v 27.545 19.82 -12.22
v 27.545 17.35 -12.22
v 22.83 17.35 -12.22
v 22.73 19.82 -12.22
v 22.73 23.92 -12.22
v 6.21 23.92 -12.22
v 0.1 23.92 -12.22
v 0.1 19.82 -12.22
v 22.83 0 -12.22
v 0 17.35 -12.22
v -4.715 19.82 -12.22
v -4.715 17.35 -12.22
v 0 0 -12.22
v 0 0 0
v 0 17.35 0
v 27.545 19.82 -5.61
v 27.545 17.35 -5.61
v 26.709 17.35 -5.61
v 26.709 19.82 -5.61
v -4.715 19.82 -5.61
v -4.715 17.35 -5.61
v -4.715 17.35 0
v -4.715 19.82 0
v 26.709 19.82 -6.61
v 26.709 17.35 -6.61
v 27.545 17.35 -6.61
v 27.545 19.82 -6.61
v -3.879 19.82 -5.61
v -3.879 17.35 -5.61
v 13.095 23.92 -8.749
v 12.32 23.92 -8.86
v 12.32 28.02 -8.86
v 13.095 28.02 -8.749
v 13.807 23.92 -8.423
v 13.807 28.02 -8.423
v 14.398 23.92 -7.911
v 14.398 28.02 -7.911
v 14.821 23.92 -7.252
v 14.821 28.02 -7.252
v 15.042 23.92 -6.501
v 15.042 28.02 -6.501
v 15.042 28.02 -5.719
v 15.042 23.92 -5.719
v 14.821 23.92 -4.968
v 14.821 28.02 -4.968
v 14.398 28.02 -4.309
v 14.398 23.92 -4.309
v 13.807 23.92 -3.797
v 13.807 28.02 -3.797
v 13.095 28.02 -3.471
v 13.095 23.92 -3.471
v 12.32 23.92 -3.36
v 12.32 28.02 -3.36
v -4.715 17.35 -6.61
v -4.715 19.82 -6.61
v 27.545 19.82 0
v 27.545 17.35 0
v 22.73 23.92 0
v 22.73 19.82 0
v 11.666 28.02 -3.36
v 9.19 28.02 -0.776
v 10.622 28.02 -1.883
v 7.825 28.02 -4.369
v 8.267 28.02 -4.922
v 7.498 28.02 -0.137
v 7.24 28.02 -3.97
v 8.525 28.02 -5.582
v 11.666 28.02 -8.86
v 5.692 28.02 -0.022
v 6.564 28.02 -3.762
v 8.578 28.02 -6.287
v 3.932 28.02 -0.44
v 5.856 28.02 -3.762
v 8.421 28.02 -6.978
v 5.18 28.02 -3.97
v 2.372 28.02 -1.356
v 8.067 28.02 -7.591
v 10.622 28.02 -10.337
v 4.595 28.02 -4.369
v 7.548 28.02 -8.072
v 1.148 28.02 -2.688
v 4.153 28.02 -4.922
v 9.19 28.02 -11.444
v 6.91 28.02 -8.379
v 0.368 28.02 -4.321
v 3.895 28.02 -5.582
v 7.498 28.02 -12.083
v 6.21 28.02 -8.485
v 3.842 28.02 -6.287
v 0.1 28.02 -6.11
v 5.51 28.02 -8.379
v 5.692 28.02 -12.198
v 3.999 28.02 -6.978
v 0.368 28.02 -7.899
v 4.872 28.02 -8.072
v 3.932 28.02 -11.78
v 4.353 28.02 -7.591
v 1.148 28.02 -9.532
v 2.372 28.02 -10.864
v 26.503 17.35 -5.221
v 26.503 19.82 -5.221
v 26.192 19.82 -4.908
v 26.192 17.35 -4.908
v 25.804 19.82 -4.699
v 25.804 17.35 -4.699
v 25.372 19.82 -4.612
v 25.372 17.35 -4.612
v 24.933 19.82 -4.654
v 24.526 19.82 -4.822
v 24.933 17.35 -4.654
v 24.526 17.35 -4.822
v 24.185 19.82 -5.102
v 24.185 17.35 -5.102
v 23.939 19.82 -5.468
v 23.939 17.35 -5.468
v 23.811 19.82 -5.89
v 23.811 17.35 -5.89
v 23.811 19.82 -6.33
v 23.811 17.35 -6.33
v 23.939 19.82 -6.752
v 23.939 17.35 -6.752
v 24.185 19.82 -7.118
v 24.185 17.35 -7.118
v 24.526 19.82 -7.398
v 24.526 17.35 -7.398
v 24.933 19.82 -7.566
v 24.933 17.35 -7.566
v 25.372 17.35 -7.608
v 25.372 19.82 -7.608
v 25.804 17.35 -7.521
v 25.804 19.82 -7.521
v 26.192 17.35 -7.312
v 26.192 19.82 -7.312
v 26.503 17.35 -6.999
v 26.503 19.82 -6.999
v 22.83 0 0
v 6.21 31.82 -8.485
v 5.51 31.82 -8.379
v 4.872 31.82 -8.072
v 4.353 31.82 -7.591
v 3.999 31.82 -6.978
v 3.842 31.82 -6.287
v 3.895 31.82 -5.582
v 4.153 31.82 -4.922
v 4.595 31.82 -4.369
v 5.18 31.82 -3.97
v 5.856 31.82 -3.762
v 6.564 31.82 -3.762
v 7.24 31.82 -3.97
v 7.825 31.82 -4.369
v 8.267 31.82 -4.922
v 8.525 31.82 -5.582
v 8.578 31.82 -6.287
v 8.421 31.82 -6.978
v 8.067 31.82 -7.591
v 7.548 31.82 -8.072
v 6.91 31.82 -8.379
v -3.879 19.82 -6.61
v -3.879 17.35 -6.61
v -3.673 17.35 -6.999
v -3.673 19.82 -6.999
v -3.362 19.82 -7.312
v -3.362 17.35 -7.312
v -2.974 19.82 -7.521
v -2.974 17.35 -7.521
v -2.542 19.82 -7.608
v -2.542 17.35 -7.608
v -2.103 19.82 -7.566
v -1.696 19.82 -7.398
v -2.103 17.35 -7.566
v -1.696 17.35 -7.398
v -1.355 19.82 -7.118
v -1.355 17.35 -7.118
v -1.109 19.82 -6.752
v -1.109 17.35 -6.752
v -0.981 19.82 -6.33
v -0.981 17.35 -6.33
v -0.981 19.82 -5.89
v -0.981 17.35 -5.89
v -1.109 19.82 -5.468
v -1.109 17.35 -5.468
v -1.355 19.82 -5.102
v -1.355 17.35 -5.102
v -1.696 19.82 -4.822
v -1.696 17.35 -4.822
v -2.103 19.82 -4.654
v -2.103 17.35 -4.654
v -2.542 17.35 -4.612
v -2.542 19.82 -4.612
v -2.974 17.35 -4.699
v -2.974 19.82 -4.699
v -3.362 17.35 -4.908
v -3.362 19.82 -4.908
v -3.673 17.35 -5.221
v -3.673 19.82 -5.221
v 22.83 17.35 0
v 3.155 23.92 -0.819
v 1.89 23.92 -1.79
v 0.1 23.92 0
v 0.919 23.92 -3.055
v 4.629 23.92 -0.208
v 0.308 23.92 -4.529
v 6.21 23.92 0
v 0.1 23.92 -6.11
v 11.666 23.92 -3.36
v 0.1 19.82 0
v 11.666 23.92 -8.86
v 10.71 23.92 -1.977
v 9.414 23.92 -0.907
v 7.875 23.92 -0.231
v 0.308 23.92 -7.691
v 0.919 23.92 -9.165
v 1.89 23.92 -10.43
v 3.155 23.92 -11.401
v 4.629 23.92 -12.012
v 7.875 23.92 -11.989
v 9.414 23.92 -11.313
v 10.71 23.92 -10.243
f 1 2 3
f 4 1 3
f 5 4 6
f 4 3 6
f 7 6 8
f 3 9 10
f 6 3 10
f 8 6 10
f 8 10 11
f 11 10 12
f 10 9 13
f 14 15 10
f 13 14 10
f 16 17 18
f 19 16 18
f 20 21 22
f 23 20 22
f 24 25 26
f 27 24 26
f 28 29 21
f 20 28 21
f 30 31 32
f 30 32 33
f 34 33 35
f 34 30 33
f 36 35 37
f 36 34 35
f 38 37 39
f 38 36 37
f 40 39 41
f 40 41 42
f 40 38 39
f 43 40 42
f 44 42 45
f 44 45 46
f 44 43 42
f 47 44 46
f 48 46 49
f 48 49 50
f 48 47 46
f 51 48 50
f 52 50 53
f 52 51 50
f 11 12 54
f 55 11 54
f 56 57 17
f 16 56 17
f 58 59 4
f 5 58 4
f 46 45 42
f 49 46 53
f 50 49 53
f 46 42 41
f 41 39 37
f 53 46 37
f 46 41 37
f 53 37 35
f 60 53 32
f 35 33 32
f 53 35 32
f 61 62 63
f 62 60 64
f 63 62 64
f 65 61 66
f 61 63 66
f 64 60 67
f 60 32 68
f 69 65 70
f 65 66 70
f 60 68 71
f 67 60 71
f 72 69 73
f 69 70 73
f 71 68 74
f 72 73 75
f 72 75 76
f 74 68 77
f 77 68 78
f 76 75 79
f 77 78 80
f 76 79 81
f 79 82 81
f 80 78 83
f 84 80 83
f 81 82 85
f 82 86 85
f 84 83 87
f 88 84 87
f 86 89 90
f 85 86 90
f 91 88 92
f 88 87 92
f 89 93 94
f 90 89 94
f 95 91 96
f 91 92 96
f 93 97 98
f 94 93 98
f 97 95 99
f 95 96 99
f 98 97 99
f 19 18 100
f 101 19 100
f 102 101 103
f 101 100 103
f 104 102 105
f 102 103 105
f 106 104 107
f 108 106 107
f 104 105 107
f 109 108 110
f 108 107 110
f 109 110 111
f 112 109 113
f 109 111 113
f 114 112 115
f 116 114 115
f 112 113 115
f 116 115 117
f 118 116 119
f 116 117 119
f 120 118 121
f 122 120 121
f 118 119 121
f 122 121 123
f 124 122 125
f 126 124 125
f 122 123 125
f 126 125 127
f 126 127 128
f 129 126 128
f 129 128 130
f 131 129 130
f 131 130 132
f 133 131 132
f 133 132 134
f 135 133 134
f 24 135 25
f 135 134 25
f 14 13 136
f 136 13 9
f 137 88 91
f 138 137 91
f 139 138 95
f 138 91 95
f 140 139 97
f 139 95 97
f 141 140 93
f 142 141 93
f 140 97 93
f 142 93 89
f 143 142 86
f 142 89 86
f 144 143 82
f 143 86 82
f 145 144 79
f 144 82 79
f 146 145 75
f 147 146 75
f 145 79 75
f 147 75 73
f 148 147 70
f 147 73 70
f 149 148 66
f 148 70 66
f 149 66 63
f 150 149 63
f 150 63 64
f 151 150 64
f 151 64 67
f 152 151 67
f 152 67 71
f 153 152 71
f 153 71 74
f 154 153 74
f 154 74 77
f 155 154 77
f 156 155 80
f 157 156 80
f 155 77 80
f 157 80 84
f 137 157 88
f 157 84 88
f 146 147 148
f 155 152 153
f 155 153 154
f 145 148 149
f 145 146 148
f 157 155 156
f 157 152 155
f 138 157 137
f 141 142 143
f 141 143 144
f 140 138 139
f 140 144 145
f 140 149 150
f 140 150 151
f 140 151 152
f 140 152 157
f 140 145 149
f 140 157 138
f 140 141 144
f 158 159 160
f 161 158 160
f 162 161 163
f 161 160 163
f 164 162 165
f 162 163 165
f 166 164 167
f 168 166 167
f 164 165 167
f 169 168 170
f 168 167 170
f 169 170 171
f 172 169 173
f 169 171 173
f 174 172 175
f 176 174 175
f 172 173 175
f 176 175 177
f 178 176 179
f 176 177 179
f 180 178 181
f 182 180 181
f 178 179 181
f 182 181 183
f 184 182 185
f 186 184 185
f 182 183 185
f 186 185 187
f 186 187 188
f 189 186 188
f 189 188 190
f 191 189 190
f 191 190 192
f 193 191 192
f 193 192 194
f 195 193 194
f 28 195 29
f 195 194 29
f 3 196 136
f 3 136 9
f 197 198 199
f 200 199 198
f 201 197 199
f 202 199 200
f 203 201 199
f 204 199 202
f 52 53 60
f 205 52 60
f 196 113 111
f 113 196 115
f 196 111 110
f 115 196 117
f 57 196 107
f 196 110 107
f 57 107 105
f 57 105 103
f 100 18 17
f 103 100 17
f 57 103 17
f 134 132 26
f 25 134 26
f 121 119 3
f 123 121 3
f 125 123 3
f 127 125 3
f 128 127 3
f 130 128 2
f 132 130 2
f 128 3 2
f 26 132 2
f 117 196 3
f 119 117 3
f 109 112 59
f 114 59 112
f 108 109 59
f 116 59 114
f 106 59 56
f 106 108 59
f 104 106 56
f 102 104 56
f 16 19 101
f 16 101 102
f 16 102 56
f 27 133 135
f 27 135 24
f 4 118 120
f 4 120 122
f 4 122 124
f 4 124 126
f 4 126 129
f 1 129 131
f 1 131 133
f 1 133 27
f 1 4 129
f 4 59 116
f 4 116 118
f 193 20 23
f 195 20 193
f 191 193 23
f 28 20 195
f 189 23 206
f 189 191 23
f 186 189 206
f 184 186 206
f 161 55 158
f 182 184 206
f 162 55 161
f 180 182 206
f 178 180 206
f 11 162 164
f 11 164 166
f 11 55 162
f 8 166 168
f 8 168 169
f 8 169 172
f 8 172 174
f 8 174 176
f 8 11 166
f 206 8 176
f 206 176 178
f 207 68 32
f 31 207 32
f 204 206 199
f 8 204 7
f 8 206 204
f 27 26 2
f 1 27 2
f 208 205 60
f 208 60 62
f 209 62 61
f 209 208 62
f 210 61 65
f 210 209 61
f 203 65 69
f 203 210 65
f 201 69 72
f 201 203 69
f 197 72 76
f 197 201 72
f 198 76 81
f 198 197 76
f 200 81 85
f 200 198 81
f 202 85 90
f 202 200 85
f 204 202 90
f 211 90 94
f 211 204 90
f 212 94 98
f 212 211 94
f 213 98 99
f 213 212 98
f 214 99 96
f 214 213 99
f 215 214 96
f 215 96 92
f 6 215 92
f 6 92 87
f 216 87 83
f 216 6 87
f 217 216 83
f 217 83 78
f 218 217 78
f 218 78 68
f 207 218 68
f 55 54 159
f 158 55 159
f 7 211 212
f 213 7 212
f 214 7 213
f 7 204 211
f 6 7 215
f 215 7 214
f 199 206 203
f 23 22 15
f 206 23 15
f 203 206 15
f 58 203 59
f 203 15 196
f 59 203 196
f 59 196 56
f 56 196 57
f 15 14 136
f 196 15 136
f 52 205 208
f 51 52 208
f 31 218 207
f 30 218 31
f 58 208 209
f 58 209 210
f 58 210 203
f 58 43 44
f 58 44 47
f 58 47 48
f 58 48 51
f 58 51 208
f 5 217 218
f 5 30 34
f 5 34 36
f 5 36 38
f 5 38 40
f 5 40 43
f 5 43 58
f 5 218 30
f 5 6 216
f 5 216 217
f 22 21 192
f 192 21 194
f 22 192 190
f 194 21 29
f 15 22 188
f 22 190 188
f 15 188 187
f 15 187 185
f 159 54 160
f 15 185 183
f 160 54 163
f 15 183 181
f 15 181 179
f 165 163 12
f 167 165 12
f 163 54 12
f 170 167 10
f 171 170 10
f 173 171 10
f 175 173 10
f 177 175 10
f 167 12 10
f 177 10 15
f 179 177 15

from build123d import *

# Parameters (mm, degrees)
SKETCH1_W           = 22.83
SKETCH1_H           = 12.22
BOSS_EXTRUDE1_DEPTH = 17.35
BOSS_EXTRUDE2_DEPTH = 2.47
SKETCH3_W           = 22.63
SKETCH3_H           = 12.22
BOSS_EXTRUDE3_DEPTH = 4.1
BOSS_EXTRUDE4_DEPTH = 4.1
SKETCH5_R           = 2.375
BOSS_EXTRUDE5_DEPTH = 3.8


with BuildPart() as part:
    # Sketch1 → Boss-Extrude1 (new body)
    with BuildSketch(Plane(origin=(0, 0, 0), x_dir=(1, 0, 0), z_dir=(0, 1, 0))):
        with Locations((11.415, 6.11)):
            Rectangle(SKETCH1_W, SKETCH1_H)
    extrude(amount=BOSS_EXTRUDE1_DEPTH)

    # Sketch2 → Boss-Extrude2 (add)
    with BuildSketch(Plane(origin=(0, 17.35, 0), x_dir=(1, 0, 0), z_dir=(0, 1, 0))):
        with BuildLine():
            Line((-4.715, 0), (27.545, 0))
            Line((27.545, 0), (27.545, 5.61))
            Line((27.545, 5.61), (26.709213562, 5.61))
            ThreePointArc((26.709213562, 5.61), (23.795, 6.11), (26.709213562, 6.61))
            Line((26.709213562, 6.61), (27.545, 6.61))
            Line((27.545, 6.61), (27.545, 12.22))
            Line((27.545, 12.22), (-4.715, 12.22))
            Line((-4.715, 12.22), (-4.715, 6.61))
            Line((-4.715, 6.61), (-3.879213562, 6.61))
            ThreePointArc((-3.879213562, 6.61), (-0.965, 6.11), (-3.879213562, 5.61))
            Line((-3.879213562, 5.61), (-4.715, 5.61))
            Line((-4.715, 5.61), (-4.715, 0))
        make_face()
    extrude(amount=BOSS_EXTRUDE2_DEPTH)

    # Sketch3 → Boss-Extrude3 (add)
    with BuildSketch(Plane(origin=(0, 19.82, 0), x_dir=(1, 0, 0), z_dir=(0, 1, 0))):
        with Locations((11.415, 6.11)):
            Rectangle(SKETCH3_W, SKETCH3_H)
    extrude(amount=BOSS_EXTRUDE3_DEPTH)

    # Sketch4 → Boss-Extrude4 (add)
    with BuildSketch(Plane(origin=(0, 23.92, 0), x_dir=(1, 0, 0), z_dir=(0, 1, 0))):
        with BuildLine():
            Line((12.32, 3.36), (11.666152491, 3.36))
            ThreePointArc((11.666152491, 3.36), (0.1, 6.11), (11.666152491, 8.86))
            Line((11.666152491, 8.86), (12.32, 8.86))
            ThreePointArc((12.32, 8.86), (15.07, 6.11), (12.32, 3.36))
        make_face()
    extrude(amount=BOSS_EXTRUDE4_DEPTH)

    # Sketch5 → Boss-Extrude5 (add)
    with BuildSketch(Plane(origin=(0, 28.02, 0), x_dir=(1, 0, 0), z_dir=(0, 1, 0))):
        with Locations(Location((6.21, 6.11, 0), (0, 0, 90))):
            Circle(SKETCH5_R)
    extrude(amount=BOSS_EXTRUDE5_DEPTH)


solid = part.part
